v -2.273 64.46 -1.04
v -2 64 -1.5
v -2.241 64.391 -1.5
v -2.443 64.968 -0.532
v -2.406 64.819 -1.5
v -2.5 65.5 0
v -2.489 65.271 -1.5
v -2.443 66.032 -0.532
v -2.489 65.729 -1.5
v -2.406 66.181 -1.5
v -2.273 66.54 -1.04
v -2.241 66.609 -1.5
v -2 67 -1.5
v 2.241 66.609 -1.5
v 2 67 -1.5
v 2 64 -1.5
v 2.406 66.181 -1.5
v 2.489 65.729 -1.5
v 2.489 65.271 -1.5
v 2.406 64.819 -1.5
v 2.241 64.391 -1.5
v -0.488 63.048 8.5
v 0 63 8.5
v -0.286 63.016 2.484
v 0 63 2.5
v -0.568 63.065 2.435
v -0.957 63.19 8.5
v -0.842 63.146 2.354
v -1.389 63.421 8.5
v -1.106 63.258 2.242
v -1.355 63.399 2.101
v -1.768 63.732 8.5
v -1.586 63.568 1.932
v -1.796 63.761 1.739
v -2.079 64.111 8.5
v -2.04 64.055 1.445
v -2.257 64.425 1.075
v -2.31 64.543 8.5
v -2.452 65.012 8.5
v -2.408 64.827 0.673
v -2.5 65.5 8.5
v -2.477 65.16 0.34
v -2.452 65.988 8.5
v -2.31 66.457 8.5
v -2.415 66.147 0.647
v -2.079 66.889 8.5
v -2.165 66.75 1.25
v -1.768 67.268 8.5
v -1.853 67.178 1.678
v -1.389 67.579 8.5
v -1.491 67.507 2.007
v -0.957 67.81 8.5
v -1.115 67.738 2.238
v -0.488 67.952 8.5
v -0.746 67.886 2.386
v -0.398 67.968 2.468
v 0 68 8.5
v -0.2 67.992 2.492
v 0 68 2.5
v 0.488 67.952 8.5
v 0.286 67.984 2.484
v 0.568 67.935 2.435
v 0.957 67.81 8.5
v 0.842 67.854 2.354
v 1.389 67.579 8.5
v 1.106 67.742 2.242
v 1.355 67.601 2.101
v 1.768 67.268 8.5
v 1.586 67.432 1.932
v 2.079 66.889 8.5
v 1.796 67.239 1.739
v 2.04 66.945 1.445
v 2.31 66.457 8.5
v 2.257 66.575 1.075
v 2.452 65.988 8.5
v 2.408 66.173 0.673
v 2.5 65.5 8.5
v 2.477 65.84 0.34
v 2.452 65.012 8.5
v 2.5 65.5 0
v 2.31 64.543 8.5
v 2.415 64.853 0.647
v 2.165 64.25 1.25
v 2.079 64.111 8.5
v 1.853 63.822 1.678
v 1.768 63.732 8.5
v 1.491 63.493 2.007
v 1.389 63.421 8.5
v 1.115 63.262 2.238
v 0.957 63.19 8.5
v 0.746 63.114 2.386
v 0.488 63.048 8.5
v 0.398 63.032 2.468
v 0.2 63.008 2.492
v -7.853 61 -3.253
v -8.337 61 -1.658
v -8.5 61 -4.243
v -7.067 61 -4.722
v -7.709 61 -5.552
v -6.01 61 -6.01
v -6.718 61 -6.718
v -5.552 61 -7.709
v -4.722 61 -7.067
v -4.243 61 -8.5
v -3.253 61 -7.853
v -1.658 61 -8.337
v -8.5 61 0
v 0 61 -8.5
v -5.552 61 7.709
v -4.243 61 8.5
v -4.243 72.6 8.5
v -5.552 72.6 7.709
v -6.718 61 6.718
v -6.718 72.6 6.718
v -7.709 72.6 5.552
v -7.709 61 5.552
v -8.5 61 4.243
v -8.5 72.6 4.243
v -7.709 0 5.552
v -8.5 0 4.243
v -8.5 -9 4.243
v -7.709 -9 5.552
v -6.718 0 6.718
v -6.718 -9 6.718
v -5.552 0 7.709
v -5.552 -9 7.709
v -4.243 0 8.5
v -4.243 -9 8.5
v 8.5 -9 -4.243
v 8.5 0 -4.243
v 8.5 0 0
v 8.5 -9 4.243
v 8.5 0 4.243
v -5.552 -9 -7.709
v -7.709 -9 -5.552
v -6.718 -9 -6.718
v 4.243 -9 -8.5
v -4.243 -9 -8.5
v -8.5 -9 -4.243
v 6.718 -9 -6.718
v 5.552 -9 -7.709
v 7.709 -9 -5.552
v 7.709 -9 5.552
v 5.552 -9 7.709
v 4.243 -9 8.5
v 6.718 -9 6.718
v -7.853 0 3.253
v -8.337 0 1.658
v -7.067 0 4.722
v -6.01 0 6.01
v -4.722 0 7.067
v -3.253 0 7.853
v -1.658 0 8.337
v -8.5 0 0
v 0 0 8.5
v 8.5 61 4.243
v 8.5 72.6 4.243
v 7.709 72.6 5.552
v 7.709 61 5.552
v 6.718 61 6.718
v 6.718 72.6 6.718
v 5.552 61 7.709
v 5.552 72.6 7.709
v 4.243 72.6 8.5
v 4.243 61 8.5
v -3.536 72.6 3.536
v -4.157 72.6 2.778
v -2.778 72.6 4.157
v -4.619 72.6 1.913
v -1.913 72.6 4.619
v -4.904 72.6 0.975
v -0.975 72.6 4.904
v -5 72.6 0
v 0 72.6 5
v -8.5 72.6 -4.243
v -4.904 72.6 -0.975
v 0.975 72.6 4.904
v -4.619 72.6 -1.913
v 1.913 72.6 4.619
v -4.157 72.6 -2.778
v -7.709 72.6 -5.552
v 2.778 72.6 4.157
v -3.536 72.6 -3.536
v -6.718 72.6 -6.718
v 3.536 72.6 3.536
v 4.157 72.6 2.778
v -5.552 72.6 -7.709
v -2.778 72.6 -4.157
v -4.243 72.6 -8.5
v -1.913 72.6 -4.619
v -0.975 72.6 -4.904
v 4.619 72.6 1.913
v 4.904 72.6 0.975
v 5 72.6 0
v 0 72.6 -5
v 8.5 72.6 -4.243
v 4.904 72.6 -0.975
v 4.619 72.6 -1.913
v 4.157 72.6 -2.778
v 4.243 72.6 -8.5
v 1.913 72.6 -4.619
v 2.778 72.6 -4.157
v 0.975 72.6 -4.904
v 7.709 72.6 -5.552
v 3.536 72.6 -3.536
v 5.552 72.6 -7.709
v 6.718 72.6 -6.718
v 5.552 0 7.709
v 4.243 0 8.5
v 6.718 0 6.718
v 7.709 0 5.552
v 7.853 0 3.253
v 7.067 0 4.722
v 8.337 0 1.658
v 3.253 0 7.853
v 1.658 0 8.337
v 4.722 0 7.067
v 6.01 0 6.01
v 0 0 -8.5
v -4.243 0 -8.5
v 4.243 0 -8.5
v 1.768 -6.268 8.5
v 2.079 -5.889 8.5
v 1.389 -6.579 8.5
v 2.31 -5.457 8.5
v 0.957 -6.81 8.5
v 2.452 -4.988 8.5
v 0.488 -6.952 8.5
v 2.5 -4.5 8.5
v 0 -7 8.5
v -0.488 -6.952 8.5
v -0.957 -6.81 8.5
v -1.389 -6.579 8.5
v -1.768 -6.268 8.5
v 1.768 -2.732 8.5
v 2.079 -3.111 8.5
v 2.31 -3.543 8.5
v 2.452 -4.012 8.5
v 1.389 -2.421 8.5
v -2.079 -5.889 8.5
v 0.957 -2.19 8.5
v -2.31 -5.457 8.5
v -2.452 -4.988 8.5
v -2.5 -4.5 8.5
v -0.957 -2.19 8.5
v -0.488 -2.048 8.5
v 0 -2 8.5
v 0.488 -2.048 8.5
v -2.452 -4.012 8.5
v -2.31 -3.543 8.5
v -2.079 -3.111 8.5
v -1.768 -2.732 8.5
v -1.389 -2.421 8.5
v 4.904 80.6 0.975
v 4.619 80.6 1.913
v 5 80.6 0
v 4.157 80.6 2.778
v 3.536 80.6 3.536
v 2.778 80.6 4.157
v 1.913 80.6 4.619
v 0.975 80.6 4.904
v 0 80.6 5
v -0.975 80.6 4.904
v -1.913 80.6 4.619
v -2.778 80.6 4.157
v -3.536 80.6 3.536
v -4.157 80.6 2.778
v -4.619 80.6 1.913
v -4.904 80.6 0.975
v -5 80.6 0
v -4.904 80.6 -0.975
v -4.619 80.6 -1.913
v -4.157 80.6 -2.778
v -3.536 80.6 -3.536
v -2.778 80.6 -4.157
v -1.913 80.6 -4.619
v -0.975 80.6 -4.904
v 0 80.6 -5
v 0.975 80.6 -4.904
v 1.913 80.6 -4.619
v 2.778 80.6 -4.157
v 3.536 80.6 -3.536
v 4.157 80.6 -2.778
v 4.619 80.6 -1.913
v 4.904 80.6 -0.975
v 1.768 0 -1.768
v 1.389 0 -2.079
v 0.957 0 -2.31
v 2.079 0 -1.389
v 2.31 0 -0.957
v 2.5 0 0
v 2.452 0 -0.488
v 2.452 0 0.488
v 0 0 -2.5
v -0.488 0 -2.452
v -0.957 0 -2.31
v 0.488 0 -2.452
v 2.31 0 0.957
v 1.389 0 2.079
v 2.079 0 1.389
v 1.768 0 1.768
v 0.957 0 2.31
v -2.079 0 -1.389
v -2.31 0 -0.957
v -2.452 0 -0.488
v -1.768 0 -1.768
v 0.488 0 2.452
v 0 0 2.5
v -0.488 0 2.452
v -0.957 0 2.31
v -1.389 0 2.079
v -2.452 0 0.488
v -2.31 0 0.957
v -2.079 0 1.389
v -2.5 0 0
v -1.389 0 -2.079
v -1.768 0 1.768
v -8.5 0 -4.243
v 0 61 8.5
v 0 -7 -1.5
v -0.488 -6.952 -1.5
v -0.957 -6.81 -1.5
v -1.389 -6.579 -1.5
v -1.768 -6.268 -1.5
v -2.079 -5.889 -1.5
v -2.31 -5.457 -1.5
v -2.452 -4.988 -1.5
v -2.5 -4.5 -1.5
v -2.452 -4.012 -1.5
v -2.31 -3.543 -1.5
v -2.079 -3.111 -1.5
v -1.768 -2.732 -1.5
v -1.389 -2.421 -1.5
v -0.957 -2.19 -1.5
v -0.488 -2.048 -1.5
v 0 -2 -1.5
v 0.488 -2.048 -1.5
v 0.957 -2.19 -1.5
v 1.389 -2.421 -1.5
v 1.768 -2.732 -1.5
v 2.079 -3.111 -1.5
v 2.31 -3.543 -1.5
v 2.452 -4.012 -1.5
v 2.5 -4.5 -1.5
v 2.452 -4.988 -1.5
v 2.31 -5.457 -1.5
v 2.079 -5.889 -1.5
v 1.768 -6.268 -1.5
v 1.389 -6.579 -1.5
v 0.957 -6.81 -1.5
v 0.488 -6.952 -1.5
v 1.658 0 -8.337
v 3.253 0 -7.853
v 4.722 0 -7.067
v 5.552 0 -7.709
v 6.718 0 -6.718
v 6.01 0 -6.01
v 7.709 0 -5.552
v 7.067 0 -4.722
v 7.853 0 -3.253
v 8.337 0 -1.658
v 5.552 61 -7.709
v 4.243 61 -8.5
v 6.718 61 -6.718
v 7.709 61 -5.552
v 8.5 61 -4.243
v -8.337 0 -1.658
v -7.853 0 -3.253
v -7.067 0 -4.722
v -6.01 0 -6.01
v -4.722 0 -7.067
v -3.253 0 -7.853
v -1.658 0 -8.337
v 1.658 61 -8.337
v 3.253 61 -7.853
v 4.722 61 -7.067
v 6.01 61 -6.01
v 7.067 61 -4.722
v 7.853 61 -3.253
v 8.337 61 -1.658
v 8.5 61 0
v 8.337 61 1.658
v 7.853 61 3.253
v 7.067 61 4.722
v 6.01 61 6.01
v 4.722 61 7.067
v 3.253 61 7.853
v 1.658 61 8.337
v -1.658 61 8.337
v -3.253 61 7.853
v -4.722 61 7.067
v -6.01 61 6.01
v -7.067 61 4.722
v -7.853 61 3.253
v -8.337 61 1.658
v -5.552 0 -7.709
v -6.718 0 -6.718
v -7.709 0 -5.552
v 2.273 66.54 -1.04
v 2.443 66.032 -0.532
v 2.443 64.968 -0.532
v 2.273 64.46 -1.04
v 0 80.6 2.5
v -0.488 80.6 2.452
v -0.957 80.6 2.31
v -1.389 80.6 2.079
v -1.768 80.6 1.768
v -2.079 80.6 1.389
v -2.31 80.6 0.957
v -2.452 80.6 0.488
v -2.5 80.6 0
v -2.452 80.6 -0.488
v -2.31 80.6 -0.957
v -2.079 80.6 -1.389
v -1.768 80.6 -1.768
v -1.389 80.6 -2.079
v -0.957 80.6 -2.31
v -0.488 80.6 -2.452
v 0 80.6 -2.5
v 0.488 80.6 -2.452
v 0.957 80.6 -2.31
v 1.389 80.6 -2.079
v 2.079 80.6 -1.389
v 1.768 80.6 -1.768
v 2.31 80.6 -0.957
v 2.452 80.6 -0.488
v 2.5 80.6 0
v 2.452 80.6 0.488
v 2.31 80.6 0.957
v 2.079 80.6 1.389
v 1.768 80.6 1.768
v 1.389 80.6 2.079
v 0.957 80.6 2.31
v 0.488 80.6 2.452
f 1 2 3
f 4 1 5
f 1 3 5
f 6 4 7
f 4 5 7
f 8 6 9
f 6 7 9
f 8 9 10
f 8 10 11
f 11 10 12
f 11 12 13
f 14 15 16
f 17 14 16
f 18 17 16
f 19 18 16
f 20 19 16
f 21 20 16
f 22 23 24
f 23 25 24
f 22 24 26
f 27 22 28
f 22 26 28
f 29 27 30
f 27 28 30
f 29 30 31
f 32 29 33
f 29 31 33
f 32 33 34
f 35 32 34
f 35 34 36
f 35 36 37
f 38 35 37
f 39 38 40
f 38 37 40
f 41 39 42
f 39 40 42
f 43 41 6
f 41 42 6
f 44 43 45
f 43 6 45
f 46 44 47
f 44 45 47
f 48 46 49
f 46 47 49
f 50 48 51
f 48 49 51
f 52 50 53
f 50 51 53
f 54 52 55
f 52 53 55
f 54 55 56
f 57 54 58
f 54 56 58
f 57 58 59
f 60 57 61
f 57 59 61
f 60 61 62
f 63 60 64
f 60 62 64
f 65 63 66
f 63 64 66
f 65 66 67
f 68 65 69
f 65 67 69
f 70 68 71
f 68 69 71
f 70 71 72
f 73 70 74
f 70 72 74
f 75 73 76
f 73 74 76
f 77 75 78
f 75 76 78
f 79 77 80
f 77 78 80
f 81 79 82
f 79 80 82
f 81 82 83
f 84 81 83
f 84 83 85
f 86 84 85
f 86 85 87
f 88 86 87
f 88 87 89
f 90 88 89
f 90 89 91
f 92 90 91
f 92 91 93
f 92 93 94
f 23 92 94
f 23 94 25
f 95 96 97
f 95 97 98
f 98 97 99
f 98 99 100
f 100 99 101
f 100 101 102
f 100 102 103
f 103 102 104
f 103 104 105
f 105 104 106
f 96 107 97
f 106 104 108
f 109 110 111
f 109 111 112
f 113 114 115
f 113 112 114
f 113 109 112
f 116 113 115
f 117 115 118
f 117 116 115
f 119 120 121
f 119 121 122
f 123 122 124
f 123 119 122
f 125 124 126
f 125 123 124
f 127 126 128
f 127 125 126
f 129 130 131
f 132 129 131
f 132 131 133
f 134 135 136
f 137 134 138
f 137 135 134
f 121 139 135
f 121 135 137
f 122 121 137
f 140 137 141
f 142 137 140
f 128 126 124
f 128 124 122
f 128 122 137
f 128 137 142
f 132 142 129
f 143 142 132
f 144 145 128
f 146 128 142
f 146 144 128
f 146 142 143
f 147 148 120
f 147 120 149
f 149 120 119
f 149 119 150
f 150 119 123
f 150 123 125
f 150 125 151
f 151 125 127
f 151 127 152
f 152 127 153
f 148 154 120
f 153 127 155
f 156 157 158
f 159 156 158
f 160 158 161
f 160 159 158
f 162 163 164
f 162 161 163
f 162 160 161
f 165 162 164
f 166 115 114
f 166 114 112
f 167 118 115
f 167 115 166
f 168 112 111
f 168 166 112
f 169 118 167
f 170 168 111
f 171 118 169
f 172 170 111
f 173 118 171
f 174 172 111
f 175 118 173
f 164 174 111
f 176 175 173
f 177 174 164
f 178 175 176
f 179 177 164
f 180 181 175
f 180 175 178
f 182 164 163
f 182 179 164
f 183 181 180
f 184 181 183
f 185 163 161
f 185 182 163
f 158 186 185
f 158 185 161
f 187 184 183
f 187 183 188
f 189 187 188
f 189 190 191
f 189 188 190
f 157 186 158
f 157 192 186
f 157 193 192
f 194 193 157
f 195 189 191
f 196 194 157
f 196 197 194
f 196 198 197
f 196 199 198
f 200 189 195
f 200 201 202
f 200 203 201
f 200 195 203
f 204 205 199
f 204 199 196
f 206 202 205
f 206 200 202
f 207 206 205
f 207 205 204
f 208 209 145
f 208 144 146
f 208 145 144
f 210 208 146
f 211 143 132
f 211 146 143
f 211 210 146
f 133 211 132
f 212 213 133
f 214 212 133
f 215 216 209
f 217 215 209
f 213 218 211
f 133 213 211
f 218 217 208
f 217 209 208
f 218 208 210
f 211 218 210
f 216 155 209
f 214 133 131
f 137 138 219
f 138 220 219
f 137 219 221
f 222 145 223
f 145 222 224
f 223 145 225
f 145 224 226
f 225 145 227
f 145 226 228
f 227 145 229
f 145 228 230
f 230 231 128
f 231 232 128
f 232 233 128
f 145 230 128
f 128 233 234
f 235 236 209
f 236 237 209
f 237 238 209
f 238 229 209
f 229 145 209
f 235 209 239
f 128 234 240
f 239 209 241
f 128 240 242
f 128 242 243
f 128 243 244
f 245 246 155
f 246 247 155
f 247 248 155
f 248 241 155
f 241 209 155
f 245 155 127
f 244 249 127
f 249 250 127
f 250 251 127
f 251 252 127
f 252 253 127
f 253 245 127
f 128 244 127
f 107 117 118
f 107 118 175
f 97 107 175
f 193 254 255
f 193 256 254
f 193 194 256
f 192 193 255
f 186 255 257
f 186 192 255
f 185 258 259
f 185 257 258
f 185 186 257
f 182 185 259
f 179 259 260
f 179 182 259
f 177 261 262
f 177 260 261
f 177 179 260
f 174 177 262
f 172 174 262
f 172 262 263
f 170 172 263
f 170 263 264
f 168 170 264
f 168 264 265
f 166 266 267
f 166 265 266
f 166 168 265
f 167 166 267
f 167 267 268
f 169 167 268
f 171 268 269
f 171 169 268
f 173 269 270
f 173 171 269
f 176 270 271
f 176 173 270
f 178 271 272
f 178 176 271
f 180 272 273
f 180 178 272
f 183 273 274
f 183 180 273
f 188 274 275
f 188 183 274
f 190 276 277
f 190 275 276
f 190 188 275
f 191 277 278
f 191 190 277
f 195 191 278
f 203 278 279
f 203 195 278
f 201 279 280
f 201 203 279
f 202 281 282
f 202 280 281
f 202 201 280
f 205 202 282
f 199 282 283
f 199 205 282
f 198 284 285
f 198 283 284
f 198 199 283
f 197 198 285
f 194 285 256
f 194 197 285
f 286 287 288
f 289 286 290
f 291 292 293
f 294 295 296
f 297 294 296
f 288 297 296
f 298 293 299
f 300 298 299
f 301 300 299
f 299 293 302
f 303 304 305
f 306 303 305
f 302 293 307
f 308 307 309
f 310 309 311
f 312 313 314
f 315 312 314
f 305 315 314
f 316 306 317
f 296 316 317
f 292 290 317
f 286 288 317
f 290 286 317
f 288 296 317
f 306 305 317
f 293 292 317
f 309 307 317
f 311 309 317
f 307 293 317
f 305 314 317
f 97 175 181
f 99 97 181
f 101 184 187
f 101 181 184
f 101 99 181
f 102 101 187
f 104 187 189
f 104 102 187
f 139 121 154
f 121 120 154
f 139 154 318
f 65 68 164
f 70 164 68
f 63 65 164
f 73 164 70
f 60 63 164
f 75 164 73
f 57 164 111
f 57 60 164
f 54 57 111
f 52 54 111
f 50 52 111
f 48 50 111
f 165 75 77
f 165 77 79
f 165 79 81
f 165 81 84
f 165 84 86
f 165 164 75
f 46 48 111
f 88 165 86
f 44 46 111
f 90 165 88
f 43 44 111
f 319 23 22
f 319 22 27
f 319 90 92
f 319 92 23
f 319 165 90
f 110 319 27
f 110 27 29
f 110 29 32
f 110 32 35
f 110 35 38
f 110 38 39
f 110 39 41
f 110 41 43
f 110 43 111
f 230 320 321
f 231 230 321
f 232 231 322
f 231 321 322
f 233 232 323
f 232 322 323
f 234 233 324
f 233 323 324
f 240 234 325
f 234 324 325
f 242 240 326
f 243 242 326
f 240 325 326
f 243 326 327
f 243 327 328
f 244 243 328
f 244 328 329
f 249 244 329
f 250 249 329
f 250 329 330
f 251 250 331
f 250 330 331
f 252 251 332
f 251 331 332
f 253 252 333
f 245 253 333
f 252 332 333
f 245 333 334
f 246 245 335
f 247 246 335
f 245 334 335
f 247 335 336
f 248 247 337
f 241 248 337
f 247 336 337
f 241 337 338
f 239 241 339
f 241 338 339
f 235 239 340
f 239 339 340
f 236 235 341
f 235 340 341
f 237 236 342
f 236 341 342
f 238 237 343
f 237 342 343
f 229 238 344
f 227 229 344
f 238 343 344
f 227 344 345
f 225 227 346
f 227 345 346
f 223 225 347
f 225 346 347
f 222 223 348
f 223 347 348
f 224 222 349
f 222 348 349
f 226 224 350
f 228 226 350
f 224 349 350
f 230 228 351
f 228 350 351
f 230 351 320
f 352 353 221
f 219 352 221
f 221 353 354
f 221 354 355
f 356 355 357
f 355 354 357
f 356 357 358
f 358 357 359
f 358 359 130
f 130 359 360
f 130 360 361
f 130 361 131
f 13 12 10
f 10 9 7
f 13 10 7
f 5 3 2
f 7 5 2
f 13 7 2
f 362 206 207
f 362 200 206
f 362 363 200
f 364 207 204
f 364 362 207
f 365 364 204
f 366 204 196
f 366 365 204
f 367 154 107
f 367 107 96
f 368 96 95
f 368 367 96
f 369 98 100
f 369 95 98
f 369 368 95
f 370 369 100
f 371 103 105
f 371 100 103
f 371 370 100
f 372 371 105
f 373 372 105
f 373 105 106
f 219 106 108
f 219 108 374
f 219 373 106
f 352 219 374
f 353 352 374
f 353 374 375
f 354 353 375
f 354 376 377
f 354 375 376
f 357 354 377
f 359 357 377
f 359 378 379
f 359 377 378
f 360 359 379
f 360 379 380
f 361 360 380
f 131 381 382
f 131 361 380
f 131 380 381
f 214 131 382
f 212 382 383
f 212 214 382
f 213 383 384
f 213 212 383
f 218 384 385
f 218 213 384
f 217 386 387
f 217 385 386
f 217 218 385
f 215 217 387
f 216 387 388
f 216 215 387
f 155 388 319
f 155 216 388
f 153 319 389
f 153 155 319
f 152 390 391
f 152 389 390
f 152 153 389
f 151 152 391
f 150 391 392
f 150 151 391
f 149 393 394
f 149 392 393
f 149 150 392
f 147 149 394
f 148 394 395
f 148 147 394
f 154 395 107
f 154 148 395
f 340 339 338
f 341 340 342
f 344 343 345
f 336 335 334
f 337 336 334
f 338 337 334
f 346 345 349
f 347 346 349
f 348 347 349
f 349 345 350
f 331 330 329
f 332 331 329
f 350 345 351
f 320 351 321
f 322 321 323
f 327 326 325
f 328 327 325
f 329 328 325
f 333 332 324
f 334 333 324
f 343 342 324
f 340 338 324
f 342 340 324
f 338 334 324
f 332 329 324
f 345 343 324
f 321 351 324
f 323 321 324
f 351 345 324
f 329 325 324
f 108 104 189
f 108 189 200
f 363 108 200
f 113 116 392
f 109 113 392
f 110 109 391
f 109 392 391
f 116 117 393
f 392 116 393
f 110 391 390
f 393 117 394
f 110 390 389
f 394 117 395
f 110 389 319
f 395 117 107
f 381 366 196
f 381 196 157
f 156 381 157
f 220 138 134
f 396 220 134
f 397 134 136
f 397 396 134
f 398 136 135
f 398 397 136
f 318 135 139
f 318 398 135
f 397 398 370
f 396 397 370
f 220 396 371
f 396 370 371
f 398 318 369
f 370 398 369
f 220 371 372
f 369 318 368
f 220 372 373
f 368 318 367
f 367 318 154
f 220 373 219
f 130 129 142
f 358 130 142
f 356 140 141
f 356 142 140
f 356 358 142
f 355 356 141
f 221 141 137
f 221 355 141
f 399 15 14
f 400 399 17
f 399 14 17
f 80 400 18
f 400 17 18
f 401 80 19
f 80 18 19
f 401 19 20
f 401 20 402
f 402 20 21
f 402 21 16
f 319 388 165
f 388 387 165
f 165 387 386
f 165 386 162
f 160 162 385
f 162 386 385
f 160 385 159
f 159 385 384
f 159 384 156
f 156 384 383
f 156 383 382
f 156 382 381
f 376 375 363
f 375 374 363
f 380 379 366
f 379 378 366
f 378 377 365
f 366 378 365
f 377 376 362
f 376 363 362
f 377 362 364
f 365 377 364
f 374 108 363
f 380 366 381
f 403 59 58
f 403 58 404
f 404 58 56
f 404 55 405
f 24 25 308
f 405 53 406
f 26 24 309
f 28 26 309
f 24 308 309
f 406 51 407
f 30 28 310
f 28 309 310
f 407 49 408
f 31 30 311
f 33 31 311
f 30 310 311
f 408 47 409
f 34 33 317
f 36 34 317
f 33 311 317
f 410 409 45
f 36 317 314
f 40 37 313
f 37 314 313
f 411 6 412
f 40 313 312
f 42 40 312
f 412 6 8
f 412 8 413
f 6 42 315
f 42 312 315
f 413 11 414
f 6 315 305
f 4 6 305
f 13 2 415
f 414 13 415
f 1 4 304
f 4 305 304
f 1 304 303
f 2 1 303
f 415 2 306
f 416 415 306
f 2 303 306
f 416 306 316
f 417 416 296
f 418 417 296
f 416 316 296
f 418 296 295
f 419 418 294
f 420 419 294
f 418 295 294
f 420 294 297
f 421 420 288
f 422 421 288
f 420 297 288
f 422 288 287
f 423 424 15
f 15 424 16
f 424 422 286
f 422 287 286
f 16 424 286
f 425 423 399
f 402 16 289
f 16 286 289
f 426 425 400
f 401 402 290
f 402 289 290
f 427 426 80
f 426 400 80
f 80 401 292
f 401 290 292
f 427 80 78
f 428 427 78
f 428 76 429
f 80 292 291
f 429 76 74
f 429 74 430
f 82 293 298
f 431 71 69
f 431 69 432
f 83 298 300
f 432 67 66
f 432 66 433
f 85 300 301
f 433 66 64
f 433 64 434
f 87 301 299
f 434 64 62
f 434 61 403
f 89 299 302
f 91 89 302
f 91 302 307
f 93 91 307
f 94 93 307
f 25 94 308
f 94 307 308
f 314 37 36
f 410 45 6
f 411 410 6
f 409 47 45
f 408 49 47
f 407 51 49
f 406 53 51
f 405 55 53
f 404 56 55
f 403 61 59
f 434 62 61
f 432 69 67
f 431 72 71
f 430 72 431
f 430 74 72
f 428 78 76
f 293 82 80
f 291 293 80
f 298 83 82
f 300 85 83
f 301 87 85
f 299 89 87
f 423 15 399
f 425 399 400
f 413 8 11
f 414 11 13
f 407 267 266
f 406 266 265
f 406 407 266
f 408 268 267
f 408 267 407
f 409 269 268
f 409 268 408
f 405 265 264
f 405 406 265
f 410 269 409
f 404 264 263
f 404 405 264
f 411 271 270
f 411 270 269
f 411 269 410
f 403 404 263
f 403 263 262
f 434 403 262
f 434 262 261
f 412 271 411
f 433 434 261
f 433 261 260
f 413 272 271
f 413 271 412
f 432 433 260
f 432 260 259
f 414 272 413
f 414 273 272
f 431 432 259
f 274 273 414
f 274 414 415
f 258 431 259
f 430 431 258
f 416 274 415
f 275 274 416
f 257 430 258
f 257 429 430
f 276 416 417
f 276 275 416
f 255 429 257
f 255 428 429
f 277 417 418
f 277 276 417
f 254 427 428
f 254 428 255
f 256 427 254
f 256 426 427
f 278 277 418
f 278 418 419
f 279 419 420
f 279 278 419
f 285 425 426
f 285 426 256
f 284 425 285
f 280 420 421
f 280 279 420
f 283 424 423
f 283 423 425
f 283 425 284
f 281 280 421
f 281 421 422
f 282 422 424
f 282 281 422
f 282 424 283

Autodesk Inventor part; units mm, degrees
ref_plane "YZ Plane" through (0, 0, 0) normal (1, 0, 0) x (0, 1, 0)
ref_plane "XZ Plane" through (0, 0, 0) normal (0, 1, 0) x (-1, 0, 0)
ref_plane "XY Plane" through (0, 0, 0) normal (0, 0, 1) x (1, 0, 0)
sketch "スケッチ1" plane through (0, 0, 0) normal (0, 1, 0) x (-1, 0, 0)
  circle A0 centre (0, 0) radius 8.5
  dimension "d0" = 17
extrude "押し出し1" add sketch "スケッチ1" along normal blind 61
sketch "スケッチ2" plane through (0, 61, 0) normal (0, 1, 0) x (1, 0, 0)
  circle A0 centre (0, 0) radius 9.5
  line L0 (8.5, -8.5) -> (-8.5, -8.5)
  line L1 (-8.5, -8.5) -> (-8.5, 8.5)
  line L2 (-8.5, 8.5) -> (8.5, 8.5)
  line L3 (8.5, 8.5) -> (8.5, -8.5)
  line L4 (8.5, -8.5) -> (-8.5, 8.5) construction
  line L5 (-8.5, -8.5) -> (8.5, 8.5) construction
  point P0 (8.5, -4.2426)
  point P1 (8.5, 4.2426)
  point P2 (4.2426, 8.5)
  point P3 (-4.2426, 8.5)
  point P4 (-8.5, 4.2426)
  point P5 (-8.5, -4.2426)
  point P6 (-4.2426, -8.5)
  point P7 (4.2426, -8.5)
  dimension "d3" = 19
  dimension "d4" = 17
  dimension "d5" = 17
extrude "押し出し2" add sketch "スケッチ2" along normal blind 11.6 contours L3 A0 L0 L1 L2
sketch "スケッチ3" plane through (0, 0, 0) normal (0, -1, 0) x (1, 0, 0)
  circle A0 centre (0, 0) radius 9.5
  line L0 (8.5, 8.5) -> (-8.5, 8.5)
  line L1 (-8.5, 8.5) -> (-8.5, -8.5)
  line L2 (-8.5, -8.5) -> (8.5, -8.5)
  line L3 (8.5, -8.5) -> (8.5, 8.5)
  line L4 (8.5, 8.5) -> (-8.5, -8.5) construction
  line L5 (-8.5, 8.5) -> (8.5, -8.5) construction
  point P0 (8.5, -4.2426)
  point P1 (8.5, 4.2426)
  point P2 (4.2426, 8.5)
  point P3 (-4.2426, 8.5)
  point P4 (-8.5, 4.2426)
  point P5 (-8.5, -4.2426)
  point P6 (-4.2426, -8.5)
  point P7 (4.2426, -8.5)
  dimension "d8" = 19
  dimension "d9" = 17
  dimension "d10" = 17
extrude "押し出し3" add sketch "スケッチ3" along normal blind 9 contours L3 A0 L2 L1 L0
sketch "スケッチ4" plane through (0, 72.6, 0) normal (0, 1, 0) x (1, 0, 0)
  circle A0 centre (0, 0) radius 5
  dimension "d13" = 10
extrude "押し出し4" add sketch "スケッチ4" along normal blind 8
thread "ねじ1" size "M10x1.5" class "6g" standard "ANSI Metric M Profile" full length
sketch "スケッチ5" plane through (-4.2426, 61, 8.5) normal (0, 0, 1) x (1, 0, 0)
  line L0 (0, -61) -> (0, -70) projected
  line L1 (0, 0) -> (0, 11.6) projected
  line L2 (0, 11.6) -> (8.4853, 11.6) projected
  line L3 (0, 0) -> (4.2426, 0) projected
  point P0 (4.2426, -61)
  point P1 (4.2426, 4.5)
  point P2 (4.2426, -65.5)
  point P3 (0, -65.5)
  point P4 (0, 5.8)
  point P5 (4.2426, 11.6)
  dimension "d18" = 4.5
hole "穴1" at (0, 65.5, 8.5) at (0, -4.5, 8.5) direction (0, 0, -1) diameter 5 depth 10
thread "ねじ2" size "M5x0.8" class "6H" standard "ANSI Metric M Profile" full length
thread "ねじ3" size "M5x0.8" class "6H" standard "ANSI Metric M Profile" full length
sketch "スケッチ6" plane through (0, 80.6, 0) normal (0, 1, 0) x (1, 0, 0)
  circle A0 centre (0, 0) radius 5 projected
hole "穴2" at (0, 80.6, 0) direction (0, -1, 0) diameter 5 depth 80.6
properties part number "KOGANEI_unkown_35_main" material "ステンレス鋼 440C"
